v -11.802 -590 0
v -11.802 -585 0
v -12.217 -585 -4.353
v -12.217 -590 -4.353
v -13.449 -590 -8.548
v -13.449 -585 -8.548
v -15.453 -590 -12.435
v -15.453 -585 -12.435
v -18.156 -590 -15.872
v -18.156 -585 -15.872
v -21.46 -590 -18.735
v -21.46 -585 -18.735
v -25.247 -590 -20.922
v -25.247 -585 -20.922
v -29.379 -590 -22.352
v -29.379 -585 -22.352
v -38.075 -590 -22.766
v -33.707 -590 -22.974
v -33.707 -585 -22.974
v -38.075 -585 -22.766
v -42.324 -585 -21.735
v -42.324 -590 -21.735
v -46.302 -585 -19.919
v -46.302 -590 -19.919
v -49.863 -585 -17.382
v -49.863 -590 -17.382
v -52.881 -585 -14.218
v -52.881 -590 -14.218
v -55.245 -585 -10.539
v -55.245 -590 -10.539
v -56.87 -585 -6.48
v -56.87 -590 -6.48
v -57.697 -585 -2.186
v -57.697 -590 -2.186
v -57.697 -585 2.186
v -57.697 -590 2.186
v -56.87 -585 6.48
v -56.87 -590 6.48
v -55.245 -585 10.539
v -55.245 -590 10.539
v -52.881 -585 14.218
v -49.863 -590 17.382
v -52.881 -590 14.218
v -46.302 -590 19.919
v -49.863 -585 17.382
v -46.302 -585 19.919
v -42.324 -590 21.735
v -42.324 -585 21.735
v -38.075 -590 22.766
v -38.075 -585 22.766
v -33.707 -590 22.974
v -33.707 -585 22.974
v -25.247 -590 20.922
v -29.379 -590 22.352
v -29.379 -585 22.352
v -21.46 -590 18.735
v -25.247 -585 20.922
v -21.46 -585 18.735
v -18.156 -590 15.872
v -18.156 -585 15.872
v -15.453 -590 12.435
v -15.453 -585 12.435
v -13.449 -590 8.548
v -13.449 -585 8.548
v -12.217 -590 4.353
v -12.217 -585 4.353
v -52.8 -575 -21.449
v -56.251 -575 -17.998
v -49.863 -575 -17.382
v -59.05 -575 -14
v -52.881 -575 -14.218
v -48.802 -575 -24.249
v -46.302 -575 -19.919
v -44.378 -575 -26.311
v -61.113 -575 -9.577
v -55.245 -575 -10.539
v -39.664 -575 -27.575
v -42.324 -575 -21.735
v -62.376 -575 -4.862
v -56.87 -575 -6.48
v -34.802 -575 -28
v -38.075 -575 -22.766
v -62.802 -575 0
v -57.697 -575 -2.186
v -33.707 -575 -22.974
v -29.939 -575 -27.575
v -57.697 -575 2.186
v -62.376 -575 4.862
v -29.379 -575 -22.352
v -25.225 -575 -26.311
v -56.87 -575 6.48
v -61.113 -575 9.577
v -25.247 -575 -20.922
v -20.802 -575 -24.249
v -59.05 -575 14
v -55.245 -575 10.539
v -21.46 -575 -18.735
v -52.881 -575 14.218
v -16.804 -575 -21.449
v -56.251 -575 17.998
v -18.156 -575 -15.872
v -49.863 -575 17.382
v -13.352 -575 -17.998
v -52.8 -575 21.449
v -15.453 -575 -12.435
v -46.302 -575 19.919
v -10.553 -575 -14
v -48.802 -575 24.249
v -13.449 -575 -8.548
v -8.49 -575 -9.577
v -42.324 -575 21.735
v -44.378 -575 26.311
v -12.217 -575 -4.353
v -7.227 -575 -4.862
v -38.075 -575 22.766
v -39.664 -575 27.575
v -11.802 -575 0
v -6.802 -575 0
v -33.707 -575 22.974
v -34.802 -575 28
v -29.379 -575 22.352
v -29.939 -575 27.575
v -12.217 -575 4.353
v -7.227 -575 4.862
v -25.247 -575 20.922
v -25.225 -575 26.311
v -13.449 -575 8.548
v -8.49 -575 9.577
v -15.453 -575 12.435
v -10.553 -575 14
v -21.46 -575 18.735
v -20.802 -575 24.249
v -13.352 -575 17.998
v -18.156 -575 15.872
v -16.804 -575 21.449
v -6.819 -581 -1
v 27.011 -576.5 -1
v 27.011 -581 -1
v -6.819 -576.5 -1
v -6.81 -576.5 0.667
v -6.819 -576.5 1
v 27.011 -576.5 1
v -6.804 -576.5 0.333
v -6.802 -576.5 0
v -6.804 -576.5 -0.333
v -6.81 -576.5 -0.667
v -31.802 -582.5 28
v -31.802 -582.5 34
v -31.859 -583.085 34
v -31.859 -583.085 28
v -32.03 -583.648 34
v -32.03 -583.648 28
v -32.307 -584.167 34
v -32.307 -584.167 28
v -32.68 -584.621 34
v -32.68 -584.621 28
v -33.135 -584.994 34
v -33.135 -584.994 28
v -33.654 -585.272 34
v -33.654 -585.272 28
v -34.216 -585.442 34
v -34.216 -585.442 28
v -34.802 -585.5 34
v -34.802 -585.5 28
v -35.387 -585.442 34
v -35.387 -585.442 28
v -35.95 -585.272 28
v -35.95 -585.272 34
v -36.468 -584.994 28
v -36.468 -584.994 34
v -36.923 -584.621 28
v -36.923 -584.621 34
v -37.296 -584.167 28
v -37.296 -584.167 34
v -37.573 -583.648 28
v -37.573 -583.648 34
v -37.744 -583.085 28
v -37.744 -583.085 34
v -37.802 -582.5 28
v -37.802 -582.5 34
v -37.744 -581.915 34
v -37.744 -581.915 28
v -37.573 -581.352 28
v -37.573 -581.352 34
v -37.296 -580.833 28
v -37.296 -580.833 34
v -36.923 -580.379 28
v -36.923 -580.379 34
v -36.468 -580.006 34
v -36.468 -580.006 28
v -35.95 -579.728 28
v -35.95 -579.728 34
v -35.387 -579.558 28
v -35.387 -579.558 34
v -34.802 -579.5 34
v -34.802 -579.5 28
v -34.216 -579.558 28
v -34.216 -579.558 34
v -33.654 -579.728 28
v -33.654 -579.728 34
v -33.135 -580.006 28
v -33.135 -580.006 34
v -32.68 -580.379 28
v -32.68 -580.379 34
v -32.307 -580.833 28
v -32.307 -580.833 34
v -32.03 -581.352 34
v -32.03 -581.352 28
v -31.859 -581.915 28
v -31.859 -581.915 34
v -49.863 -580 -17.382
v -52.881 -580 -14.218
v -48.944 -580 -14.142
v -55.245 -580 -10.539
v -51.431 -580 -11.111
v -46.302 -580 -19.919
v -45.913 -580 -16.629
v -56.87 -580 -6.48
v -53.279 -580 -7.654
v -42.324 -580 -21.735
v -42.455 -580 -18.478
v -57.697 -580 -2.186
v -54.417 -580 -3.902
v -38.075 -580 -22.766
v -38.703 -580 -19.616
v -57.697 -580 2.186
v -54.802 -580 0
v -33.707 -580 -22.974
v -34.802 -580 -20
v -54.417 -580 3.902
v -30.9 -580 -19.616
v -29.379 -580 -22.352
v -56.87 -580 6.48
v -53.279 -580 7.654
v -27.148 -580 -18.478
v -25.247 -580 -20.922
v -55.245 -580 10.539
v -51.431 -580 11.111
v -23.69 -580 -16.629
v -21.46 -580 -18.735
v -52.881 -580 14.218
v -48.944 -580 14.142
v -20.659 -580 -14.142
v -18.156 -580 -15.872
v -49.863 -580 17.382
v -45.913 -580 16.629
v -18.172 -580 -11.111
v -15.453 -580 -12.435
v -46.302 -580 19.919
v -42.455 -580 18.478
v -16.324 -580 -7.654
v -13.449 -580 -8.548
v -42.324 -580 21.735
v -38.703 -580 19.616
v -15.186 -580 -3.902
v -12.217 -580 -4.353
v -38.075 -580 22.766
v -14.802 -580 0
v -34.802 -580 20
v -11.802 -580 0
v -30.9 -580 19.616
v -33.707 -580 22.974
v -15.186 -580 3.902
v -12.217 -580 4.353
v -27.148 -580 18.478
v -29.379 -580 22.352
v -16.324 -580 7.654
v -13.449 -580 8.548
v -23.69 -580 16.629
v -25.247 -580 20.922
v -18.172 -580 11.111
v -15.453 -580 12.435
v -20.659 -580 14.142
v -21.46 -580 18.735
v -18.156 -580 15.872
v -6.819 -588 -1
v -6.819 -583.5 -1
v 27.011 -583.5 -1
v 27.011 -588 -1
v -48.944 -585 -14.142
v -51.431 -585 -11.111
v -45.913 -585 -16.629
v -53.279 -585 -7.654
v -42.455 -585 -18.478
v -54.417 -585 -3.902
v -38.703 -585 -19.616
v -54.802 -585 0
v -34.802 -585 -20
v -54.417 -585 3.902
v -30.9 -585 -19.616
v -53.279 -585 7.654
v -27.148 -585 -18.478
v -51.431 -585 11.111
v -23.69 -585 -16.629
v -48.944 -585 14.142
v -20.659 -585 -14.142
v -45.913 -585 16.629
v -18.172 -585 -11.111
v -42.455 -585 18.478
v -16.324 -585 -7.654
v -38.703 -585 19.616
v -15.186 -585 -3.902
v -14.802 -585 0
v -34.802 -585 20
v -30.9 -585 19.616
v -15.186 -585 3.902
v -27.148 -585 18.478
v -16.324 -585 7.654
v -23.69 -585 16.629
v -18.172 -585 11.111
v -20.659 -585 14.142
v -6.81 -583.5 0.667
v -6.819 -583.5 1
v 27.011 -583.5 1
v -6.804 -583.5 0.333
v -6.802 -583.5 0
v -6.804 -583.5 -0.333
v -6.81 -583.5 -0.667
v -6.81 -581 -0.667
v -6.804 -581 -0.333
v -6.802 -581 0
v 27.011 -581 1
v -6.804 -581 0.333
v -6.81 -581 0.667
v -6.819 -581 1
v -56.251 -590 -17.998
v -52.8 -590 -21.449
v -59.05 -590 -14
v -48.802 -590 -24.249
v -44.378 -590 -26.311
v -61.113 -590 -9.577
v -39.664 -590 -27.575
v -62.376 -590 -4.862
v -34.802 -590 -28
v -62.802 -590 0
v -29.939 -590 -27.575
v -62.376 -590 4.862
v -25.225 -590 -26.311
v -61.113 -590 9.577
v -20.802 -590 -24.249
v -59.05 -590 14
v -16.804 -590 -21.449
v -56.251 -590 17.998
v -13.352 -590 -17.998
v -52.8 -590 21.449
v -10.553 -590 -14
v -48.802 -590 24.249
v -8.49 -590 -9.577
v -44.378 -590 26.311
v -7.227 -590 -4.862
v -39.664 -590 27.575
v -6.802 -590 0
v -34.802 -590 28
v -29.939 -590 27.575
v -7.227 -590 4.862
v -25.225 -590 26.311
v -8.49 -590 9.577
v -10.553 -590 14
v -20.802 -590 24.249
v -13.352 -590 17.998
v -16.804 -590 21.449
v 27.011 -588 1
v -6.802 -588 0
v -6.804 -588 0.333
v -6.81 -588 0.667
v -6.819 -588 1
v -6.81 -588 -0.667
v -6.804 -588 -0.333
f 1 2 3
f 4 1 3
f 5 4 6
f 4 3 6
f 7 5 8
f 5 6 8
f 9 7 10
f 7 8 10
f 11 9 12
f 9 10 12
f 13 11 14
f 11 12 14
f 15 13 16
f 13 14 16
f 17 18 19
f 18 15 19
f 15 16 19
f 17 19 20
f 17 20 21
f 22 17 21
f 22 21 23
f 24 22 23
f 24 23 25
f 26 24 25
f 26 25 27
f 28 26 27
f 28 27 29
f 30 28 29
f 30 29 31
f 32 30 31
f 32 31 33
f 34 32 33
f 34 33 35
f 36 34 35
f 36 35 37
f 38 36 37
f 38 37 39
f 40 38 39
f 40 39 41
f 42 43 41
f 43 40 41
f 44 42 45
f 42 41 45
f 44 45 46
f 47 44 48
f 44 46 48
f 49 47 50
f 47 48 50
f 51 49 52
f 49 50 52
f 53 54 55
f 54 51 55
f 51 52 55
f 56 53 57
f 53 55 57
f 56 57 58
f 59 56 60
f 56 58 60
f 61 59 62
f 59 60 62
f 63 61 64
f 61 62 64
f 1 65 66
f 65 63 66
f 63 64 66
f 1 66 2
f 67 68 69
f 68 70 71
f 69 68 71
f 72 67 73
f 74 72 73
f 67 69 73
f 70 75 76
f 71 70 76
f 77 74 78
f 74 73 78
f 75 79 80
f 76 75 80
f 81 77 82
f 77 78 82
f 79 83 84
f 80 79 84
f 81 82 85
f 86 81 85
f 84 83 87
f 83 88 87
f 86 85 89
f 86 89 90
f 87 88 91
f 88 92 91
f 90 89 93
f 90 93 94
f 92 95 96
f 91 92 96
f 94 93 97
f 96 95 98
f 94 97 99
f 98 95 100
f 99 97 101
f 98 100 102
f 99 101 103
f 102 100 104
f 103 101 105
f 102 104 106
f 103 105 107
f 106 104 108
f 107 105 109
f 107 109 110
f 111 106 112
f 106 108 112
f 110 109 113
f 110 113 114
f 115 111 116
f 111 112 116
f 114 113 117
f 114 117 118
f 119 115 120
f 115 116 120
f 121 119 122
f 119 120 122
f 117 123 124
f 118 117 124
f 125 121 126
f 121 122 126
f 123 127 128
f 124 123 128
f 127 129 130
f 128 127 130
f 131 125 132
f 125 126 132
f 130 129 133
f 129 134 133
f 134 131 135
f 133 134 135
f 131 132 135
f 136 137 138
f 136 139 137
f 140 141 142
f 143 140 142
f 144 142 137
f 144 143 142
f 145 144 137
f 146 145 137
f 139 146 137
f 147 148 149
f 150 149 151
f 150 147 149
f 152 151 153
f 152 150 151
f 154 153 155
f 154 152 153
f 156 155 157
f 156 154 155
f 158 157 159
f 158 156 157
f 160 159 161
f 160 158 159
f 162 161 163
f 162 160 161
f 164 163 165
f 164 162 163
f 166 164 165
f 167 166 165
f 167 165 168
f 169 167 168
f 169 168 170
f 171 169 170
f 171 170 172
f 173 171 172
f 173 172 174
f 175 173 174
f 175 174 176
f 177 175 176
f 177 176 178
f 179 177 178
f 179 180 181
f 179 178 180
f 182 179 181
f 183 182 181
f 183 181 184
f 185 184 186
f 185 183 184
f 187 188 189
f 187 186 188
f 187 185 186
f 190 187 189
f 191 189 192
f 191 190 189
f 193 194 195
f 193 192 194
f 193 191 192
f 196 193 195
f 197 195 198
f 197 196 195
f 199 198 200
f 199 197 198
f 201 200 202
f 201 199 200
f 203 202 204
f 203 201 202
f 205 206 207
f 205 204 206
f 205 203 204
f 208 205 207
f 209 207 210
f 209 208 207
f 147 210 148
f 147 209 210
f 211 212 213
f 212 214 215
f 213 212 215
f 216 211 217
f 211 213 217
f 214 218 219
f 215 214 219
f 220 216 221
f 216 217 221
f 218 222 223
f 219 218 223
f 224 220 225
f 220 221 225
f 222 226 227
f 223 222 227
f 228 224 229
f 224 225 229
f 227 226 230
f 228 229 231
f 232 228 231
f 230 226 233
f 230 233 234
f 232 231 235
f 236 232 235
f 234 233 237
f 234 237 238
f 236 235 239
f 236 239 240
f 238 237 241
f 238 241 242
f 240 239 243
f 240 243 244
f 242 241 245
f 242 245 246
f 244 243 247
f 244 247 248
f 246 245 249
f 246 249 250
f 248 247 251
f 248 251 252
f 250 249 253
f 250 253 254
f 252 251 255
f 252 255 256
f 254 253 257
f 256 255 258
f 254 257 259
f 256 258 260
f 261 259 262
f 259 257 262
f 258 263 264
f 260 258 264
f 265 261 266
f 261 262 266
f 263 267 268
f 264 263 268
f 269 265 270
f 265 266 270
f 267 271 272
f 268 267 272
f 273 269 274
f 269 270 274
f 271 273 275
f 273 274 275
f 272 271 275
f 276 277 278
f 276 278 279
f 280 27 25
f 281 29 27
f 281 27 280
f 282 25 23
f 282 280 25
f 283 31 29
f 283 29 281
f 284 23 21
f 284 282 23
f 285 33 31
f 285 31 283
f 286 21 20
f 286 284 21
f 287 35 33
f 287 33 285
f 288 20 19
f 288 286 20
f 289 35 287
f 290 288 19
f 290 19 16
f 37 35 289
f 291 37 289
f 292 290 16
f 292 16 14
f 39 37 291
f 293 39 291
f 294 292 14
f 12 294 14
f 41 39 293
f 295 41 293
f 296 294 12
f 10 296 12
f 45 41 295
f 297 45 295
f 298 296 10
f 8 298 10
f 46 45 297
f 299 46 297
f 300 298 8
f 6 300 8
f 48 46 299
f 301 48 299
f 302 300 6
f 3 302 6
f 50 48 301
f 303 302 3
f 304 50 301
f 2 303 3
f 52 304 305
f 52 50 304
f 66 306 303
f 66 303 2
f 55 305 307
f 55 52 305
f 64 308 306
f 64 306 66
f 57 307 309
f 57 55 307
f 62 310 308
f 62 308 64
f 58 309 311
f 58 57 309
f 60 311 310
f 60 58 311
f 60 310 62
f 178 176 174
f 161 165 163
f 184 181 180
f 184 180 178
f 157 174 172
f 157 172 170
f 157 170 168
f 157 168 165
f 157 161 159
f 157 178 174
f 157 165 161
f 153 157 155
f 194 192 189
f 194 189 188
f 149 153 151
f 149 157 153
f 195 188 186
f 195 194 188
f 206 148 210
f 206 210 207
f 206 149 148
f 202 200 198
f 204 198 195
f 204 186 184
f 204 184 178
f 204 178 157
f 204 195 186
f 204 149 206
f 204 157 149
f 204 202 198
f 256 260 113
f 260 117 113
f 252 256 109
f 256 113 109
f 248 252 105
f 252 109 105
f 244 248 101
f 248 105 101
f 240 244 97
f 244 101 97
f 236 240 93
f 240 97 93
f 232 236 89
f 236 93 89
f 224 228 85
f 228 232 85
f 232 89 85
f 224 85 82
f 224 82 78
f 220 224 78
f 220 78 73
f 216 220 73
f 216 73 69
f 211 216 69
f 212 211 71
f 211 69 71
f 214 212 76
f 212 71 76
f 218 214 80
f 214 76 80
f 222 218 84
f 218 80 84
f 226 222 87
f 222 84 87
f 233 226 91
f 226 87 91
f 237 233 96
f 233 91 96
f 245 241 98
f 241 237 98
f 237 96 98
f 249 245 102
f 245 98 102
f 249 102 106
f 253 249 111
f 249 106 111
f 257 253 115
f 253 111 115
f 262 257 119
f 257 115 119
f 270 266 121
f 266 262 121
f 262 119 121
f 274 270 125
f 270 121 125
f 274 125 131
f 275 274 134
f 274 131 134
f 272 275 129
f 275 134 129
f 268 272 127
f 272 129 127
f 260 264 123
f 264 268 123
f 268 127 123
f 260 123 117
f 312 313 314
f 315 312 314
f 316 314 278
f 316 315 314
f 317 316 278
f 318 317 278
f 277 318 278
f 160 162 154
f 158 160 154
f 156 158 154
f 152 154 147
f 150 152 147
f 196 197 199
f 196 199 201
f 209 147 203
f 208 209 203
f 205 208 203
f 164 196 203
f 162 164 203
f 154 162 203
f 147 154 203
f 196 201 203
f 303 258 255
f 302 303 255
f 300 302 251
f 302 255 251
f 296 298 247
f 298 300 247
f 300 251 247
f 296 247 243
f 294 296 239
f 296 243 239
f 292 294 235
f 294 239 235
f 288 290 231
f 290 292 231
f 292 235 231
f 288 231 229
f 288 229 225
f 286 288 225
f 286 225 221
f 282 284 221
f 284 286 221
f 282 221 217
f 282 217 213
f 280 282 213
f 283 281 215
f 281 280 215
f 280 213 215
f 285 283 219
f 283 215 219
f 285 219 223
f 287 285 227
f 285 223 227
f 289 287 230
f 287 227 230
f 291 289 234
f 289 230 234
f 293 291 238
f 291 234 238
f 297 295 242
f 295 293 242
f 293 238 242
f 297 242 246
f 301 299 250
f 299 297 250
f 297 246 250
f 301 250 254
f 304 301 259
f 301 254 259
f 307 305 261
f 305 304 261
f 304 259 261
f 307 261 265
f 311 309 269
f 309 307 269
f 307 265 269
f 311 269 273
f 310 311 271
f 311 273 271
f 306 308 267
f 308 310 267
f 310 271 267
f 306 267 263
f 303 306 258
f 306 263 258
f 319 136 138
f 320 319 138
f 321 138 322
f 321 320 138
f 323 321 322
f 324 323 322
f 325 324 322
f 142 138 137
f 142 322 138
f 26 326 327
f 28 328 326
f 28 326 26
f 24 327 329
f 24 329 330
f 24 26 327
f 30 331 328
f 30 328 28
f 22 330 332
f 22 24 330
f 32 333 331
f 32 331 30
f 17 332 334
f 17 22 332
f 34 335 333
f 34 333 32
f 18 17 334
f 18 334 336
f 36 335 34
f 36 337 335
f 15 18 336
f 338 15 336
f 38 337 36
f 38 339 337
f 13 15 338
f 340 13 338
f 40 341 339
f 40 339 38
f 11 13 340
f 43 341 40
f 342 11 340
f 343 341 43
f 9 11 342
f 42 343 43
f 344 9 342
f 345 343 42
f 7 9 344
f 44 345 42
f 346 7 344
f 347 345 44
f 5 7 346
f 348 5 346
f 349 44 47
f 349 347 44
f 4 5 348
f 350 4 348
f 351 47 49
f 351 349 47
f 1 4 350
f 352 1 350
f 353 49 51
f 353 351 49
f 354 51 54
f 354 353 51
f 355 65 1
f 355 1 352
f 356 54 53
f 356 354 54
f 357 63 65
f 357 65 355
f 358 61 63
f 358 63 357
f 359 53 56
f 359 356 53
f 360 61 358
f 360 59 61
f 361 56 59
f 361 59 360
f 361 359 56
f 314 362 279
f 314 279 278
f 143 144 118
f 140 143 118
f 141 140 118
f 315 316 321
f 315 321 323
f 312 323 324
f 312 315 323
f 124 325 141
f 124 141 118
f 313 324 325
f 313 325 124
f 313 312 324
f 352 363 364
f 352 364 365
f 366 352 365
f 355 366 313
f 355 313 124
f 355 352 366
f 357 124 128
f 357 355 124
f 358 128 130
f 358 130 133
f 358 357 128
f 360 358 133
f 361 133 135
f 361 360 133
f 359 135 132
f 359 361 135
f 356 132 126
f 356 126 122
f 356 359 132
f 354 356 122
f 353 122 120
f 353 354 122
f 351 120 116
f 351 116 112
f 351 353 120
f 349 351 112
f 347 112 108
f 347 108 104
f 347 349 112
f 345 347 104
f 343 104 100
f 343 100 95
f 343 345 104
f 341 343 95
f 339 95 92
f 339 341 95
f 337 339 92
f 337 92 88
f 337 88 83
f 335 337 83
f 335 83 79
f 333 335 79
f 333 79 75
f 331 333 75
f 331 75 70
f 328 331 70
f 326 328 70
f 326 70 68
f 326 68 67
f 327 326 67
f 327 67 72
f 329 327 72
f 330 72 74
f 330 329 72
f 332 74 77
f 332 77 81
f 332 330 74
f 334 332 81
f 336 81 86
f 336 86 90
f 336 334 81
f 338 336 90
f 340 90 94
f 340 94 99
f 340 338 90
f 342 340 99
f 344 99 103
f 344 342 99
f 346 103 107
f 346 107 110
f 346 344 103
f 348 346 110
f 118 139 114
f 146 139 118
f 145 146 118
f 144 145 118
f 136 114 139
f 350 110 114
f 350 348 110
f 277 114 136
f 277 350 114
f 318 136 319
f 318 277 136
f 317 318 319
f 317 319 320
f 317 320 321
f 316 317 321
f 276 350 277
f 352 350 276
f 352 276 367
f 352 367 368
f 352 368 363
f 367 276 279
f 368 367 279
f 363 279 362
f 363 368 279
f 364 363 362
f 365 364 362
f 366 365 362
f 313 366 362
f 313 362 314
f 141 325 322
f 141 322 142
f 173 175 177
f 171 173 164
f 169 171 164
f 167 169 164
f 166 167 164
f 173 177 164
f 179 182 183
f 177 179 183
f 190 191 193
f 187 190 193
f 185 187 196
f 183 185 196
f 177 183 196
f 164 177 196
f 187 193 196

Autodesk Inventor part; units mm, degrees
ref_plane "XZ Plane" through (0, 0, 0) normal (0, 1, 0) x (-1, 0, 0)
sketch "Sketch1" plane through (0, 0, 0) normal (0, 0, 1) x (1, 0, 0)
  line L0 (-34.8016, 76.5) -> (-34.8016, -850)
  line L1 (-34.8016, 76.5) -> (-34.8016, -850)
  line L2 (-14.8016, -585) -> (-14.8016, -580)
  line L3 (-14.8016, -580) -> (-11.8016, -580)
  line L4 (-11.8016, -580) -> (-11.8016, -575)
  line L5 (-11.8016, -575) -> (-6.8016, -575)
  line L6 (-6.8016, -575) -> (-6.8016, -590)
  line L7 (-6.8016, -590) -> (-11.8016, -590)
  line L8 (-11.8016, -590) -> (-11.8016, -585)
  line L9 (-11.8016, -585) -> (-14.8016, -585)
  point P0 (0, 0)
  dimension "d0" = 28
  dimension "d1" = 20
  dimension "d2" = 3
  dimension "d3" = 15
  dimension "d4" = 260
  dimension "d5" = 5
revolve "Revolution1" add sketch "Sketch1" angle 360 about axis through (-34.8016, 76.5, 0) along (0, -1, 0)
ref_plane "Work Plane1" through (-6.8016, -582.5, 0) normal (1, 0, 0) x (0, 1, 0)
sketch "Sketch2" plane through (-6.8016, -582.5, 0) normal (1, 0, 0) x (0, 1, 0)
  line L0 (-5.5, 1) -> (-1, 1)
  line L1 (-1, 1) -> (-1, -1)
  line L2 (-1, -1) -> (-5.5, -1)
  line L3 (-5.5, -1) -> (-5.5, 1)
  line L4 (582.5, -1.5) -> (582.5, 1.5) projected
  line L5 (-267.5, 1.5) -> (582.5, 1.5) projected
  line L6 (-267.5, -1.5) -> (-267.5, 1.5) projected
  line L7 (-267.5, -1.5) -> (582.5, -1.5) projected
  line L8 (-7.5, 28) -> (-7.5, -28) projected
  line L9 (1.5, 1) -> (6, 1)
  line L10 (6, 1) -> (6, -1)
  line L11 (6, -1) -> (1.5, -1)
  line L12 (1.5, -1) -> (1.5, 1)
  point P0 (582.5, 0)
  dimension "d7" = 0.5
  dimension "d8" = 0.5
  dimension "d9" = 4.5
  dimension "d10" = 2
  dimension "d13" = 7
extrude "Extrusion1" add sketch "Sketch2" along normal blind 33.8125 and the other way blind 2.619 contours L0 L1 L2 L3 | L9 L10 L11 L12
ref_plane "Work Plane2" through (-34.8016, -582.5, 28) normal (0, 0, 1) x (1, 0, 0)
sketch "Sketch3" plane through (-34.8016, -582.5, 28) normal (0, 0, 1) x (1, 0, 0)
  circle A0 centre (0, 0) radius 3
  line L0 (27.9821, 6) -> (27.9821, 6) projected
  line L1 (27.9821, 6) -> (27.9821, 1.5) projected
  line L2 (27.9821, 1.5) -> (27.9821, 1.5) projected
  line L3 (27.9821, 1.5) -> (27.9821, 6) projected
  line L4 (27.9821, -1) -> (27.9821, -1) projected
  line L5 (27.9821, -1) -> (27.9821, -5.5) projected
  line L6 (27.9821, -5.5) -> (27.9821, -5.5) projected
  line L7 (27.9821, -5.5) -> (27.9821, -1) projected
  line L8 (-28, -7.5) -> (28, -7.5) projected
  line L9 (-28, 7.5) -> (28, 7.5) projected
  point P0 (34.8016, 582.5)
  dimension "d22" = 6
  dimension "d23" = 7.5
  dimension "d24" = 28
extrude "Extrusion2" add sketch "Sketch3" along normal blind 6
properties part number "TriggerRing"
